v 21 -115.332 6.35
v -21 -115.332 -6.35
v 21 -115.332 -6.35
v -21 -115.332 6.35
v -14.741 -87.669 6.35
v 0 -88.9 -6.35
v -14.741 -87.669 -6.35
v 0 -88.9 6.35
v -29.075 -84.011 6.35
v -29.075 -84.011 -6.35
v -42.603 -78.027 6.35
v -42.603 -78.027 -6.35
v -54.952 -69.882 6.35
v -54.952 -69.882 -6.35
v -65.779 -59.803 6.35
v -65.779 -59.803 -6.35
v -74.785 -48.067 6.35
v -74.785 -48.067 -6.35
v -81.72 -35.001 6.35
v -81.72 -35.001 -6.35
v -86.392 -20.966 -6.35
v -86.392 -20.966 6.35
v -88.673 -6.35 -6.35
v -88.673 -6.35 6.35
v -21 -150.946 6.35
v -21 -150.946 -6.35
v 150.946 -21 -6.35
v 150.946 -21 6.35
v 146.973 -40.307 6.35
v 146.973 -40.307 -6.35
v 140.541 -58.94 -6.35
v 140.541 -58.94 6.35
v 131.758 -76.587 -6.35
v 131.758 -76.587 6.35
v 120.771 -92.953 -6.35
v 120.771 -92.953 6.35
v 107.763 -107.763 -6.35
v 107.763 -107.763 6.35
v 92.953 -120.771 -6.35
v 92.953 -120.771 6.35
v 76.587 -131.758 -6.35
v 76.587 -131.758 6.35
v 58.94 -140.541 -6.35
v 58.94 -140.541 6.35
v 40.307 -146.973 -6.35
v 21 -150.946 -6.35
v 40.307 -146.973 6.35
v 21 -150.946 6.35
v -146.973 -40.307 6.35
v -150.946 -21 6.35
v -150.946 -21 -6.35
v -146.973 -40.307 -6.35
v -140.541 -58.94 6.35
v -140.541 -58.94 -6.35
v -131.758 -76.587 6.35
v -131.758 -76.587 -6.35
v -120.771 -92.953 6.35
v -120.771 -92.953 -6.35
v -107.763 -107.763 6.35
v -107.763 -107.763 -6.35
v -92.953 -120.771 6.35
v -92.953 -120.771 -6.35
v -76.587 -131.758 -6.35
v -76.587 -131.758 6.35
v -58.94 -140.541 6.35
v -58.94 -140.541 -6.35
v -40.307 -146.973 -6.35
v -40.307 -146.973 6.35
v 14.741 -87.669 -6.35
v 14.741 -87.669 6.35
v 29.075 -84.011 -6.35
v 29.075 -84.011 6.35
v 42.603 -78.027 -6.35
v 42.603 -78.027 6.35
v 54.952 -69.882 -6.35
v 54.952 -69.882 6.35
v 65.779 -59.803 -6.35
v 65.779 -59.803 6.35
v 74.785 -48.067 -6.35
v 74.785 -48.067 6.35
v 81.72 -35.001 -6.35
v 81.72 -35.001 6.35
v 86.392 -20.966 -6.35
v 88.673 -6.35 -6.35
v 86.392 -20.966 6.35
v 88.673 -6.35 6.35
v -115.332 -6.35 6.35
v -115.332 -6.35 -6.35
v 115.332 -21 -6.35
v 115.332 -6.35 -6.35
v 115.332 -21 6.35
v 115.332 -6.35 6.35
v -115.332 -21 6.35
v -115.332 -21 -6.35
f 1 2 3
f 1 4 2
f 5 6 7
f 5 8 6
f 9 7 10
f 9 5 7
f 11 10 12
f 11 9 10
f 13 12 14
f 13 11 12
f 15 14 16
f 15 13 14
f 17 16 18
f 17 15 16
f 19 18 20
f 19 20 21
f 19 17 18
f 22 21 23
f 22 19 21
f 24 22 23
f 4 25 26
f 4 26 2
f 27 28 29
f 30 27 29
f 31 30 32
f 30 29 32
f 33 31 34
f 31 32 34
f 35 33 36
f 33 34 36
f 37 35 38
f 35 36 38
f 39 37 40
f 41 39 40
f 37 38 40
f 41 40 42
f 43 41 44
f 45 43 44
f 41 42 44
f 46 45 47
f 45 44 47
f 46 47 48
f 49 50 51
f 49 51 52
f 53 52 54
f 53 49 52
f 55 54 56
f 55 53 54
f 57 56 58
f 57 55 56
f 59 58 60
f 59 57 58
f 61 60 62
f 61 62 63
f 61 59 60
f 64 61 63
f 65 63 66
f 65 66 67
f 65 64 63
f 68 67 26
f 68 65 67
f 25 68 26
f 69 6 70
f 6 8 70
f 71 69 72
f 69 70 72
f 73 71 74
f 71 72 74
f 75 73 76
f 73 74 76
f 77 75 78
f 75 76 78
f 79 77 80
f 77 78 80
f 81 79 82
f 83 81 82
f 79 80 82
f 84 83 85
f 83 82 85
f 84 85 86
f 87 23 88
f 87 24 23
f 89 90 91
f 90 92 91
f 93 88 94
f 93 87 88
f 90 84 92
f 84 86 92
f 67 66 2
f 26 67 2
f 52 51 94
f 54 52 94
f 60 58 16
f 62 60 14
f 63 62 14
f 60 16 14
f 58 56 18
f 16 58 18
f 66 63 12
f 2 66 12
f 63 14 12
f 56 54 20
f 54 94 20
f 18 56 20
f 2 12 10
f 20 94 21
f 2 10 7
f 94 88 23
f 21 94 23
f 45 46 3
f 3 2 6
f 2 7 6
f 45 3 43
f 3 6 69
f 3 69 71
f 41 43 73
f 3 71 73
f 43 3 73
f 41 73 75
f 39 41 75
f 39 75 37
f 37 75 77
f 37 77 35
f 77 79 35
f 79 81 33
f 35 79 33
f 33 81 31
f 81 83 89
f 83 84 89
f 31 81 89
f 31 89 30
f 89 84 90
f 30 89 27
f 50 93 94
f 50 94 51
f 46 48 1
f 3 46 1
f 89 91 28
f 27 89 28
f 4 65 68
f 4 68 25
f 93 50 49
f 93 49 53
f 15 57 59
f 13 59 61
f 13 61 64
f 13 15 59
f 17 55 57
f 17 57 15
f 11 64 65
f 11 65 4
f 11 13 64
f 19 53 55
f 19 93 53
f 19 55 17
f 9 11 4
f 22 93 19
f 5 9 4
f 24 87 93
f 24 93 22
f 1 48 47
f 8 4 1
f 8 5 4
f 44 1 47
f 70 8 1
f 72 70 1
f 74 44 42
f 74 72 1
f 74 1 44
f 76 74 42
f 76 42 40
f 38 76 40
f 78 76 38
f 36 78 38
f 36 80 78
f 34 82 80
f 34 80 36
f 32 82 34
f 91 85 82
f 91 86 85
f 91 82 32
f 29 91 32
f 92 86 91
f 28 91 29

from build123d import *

# Parameters (mm, degrees)
BOSS_EXTRUDE4_DEPTH = 6.35


with BuildPart() as part:
    # Sketch1 → Boss-Extrude4 (new, symmetric)
    with BuildSketch(Plane.XY):
        with BuildLine():
            Line((21, -150.946215587), (21, -115.332))
            Line((21, -115.332), (0, -115.332))
            Line((0, -115.332), (0, -88.9))
            ThreePointArc((0, -88.9), (60.57513929, -65.068137364), (88.672924278, -6.35))
            Line((88.672924278, -6.35), (115.332, -6.35))
            Line((115.332, -6.35), (115.332, -21))
            Line((115.332, -21), (150.946215587, -21))
            ThreePointArc((150.946215587, -21), (107.763073453, -107.763073453), (21, -150.946215587))
        make_face()
    boss_extrude4 = extrude(amount=BOSS_EXTRUDE4_DEPTH, both=True)

    # Mirror1: Boss-Extrude4 across plane
    add(boss_extrude4.mirror(Plane(origin=(0, 0, 0), x_dir=(0, 0, 1), z_dir=(1, 0, 0))))


solid = part.part
